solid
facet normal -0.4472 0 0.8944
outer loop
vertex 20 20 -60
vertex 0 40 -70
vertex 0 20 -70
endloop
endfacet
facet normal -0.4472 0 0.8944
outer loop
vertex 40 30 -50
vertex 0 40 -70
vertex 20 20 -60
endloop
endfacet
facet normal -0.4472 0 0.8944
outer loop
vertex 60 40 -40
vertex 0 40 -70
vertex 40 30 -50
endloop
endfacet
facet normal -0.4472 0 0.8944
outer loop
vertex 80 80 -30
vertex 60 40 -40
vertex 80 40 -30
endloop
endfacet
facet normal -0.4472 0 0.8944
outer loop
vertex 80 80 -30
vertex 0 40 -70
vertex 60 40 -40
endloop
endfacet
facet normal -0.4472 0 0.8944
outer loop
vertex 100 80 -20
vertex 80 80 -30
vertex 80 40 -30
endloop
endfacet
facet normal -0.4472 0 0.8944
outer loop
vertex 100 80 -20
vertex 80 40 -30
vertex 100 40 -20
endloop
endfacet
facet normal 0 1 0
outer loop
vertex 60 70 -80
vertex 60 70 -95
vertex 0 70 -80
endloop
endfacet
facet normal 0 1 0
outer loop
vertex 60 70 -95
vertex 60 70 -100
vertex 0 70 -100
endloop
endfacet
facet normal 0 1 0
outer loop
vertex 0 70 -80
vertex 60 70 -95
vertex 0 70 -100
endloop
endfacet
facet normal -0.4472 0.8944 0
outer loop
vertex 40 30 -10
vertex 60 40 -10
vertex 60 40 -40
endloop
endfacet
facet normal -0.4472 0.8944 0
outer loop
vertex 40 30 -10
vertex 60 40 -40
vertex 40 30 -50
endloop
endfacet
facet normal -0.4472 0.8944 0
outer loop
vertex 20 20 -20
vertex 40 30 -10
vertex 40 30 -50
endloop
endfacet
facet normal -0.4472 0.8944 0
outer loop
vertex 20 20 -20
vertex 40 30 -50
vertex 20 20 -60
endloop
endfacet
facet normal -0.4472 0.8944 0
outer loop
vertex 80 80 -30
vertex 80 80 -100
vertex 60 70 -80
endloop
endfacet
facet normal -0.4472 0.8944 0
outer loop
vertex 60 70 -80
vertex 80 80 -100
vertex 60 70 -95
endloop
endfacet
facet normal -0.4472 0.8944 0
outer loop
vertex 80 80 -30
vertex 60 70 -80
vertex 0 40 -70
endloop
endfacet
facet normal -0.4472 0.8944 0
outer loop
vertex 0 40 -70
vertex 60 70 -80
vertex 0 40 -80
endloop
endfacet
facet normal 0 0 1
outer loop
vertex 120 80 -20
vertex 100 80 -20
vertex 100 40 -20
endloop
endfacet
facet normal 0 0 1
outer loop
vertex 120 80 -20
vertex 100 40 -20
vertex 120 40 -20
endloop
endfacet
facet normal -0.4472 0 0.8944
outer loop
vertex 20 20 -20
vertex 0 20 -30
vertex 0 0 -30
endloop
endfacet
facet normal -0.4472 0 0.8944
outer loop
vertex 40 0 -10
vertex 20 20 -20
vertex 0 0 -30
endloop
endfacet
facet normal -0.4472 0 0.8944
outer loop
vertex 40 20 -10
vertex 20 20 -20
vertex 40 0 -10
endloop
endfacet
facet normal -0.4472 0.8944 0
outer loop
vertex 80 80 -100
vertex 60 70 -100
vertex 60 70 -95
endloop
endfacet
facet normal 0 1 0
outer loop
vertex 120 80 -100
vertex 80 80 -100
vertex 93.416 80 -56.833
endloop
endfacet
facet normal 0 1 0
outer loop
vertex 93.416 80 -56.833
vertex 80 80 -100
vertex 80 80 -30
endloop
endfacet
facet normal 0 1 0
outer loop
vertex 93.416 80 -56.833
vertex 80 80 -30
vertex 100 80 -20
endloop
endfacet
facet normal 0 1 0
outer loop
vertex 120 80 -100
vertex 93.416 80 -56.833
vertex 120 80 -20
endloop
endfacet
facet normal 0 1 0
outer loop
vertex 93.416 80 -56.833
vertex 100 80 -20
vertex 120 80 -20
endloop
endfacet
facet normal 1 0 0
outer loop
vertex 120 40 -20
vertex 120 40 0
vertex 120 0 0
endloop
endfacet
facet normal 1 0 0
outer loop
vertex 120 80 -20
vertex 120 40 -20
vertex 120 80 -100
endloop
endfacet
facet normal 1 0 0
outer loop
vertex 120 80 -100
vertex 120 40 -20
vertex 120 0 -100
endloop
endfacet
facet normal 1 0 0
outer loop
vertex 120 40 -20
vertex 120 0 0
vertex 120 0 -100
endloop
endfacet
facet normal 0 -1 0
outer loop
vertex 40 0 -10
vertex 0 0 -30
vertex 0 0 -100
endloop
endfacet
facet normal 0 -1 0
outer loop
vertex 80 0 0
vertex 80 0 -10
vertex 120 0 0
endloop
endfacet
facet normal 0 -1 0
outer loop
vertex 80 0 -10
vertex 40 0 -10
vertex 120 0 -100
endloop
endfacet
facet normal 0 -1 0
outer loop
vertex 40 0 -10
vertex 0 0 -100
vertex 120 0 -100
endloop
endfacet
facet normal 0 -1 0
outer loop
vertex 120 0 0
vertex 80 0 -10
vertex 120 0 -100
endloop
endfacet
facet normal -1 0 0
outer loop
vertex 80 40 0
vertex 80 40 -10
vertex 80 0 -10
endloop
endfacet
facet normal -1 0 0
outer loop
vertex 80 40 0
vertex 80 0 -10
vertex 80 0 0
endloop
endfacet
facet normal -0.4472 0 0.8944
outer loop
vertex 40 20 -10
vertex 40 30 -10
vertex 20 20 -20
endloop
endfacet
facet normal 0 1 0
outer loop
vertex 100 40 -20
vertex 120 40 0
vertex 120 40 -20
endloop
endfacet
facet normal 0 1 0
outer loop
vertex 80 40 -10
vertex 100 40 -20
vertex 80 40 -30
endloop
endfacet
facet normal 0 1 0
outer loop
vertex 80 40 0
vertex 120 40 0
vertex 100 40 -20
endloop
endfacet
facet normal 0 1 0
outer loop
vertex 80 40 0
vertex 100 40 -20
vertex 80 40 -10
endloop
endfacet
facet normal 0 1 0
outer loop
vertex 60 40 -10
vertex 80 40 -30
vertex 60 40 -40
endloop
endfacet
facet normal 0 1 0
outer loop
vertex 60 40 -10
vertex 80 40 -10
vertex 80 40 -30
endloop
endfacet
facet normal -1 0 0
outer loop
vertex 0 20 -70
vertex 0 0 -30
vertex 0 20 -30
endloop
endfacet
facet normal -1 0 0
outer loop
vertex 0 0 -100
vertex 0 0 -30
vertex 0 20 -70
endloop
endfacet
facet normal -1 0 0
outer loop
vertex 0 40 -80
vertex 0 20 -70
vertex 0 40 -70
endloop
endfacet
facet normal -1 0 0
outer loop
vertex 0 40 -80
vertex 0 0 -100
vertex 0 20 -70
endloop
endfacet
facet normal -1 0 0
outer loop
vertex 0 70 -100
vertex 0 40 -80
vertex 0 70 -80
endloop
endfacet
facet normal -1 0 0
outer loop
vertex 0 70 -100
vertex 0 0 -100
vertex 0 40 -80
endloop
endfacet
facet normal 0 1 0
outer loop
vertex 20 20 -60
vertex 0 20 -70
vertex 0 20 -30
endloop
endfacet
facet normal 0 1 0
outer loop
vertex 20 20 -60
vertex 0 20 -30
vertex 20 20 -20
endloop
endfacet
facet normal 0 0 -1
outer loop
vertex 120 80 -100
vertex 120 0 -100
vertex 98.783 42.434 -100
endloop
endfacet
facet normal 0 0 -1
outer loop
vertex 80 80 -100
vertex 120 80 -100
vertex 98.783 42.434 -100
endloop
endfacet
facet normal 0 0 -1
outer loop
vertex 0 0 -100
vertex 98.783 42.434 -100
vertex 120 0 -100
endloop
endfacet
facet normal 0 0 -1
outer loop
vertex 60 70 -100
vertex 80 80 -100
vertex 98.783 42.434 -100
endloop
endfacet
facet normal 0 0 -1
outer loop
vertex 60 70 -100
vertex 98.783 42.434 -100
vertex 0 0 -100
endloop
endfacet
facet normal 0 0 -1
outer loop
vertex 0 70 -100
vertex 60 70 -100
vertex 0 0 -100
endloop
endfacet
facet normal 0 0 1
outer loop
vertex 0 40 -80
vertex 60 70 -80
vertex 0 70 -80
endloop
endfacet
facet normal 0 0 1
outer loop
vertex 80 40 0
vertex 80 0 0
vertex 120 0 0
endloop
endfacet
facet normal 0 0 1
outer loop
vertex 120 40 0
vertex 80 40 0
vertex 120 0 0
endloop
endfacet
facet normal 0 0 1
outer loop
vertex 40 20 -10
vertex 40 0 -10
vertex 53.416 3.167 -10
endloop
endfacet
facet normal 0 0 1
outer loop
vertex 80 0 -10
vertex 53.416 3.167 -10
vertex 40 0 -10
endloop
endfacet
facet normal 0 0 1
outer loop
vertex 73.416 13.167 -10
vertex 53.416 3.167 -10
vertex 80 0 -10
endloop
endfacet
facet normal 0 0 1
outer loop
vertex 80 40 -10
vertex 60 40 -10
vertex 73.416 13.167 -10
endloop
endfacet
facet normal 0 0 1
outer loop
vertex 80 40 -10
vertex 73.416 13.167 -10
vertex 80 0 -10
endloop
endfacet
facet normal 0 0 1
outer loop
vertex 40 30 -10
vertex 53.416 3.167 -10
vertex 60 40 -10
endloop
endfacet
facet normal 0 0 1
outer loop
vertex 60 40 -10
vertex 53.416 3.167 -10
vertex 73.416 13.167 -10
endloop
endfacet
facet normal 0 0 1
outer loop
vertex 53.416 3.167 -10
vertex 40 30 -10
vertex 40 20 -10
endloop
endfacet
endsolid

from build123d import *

# Parameters (mm, degrees)
SKETCH1_W            = 120
SKETCH1_H            = 100
BOSS_EXTRUDE1_DEPTH  = 20
CUT_EXTRUDE1_DEPTH   = 20
SKETCH3_W            = 40
SKETCH3_H            = 40
BOSS_EXTRUDE3_DEPTH  = 100
BOSS_EXTRUDE4_DEPTH  = 90
SKETCH5_W            = 20
SKETCH5_H            = 40
BOSS_EXTRUDE6_DEPTH  = 80
BOSS_EXTRUDE7_DEPTH  = 80
SKETCH7_W            = 60
SKETCH7_H            = 50
BOSS_EXTRUDE8_DEPTH  = 20
SKETCH8_W            = 10
SKETCH8_H            = 20
BOSS_EXTRUDE9_DEPTH  = 10
BOSS_EXTRUDE10_DEPTH = 42
BOSS_EXTRUDE18_DEPTH = 42
BOSS_EXTRUDE19_DEPTH = 30
BOSS_EXTRUDE21_DEPTH = 30
BOSS_EXTRUDE22_DEPTH = 30
BOSS_EXTRUDE23_DEPTH = 30
BOSS_EXTRUDE24_DEPTH = 30
SKETCH22_W           = 120
SKETCH22_H           = 100
CUT_EXTRUDE3_DEPTH   = 30


with BuildPart() as part:
    # Sketch1 → Boss-Extrude1 (new body)
    with BuildSketch(Plane(origin=(0, 0, 0), x_dir=(1, 0, 0), z_dir=(0, 1, 0))):
        with Locations((60, 50)):
            Rectangle(SKETCH1_W, SKETCH1_H)
    extrude(amount=BOSS_EXTRUDE1_DEPTH)

    # Sketch2 → Cut-Extrude1 (cut)
    with BuildSketch(Plane(origin=(0, 20, 0), x_dir=(1, 0, 0), z_dir=(0, 1, 0))):
        Polygon((0, 30), (40, 10), (80, 10), (80, 0), (0, 0), align=None)
    extrude(amount=-CUT_EXTRUDE1_DEPTH, mode=Mode.SUBTRACT)

    # Sketch3 → Boss-Extrude3 (add)
    with BuildSketch(Plane.XY):
        with Locations((100, 20)):
            Rectangle(SKETCH3_W, SKETCH3_H)
    extrude(amount=-BOSS_EXTRUDE3_DEPTH)

    # Sketch4 → Boss-Extrude4 (add)
    with BuildSketch(Plane.XY.offset(-10)):
        Polygon((80, 20), (80, 40), (60, 40), (40, 30), (40, 20), align=None)
    extrude(amount=-BOSS_EXTRUDE4_DEPTH)

    # Sketch5 → Boss-Extrude6 (add)
    with BuildSketch(Plane.XY.offset(-20)):
        with Locations((110, 60)):
            Rectangle(SKETCH5_W, SKETCH5_H)
    extrude(amount=-BOSS_EXTRUDE6_DEPTH)

    # Sketch6 → Boss-Extrude7 (add)
    with BuildSketch(Plane(origin=(0, 80, 0), x_dir=(1, 0, 0), z_dir=(0, 1, 0))):
        Polygon((100, 100), (80, 100), (80, 30), (100, 20), align=None)
    extrude(amount=-BOSS_EXTRUDE7_DEPTH)

    # Sketch7 → Boss-Extrude8 (add)
    with BuildSketch(Plane(origin=(0, 0, -100), x_dir=(-1, 0, 0), z_dir=(0, 0, -1))):
        with Locations((-30, 45)):
            Rectangle(SKETCH7_W, SKETCH7_H)
    extrude(amount=-BOSS_EXTRUDE8_DEPTH)

    # Sketch8 → Boss-Extrude9 (add)
    with BuildSketch(Plane.XY.offset(-80)):
        with Locations((5, 30)):
            Rectangle(SKETCH8_W, SKETCH8_H)
    extrude(amount=BOSS_EXTRUDE9_DEPTH)

    # Sketch9 → Boss-Extrude10 (add)
    with BuildSketch(Plane(origin=(-16, 32, 0), x_dir=(-0.894427191, -0.447213595, 0), z_dir=(0.447213595, -0.894427191, 0))):
        Polygon((-107.33126292, 100), (-107.33126292, 30), (-17.88854382, 70), (-17.88854382, 80), align=None)
    extrude(amount=BOSS_EXTRUDE10_DEPTH)

    # Sketch11 → Boss-Extrude18 (add)
    with BuildSketch(Plane(origin=(0, 0, -100), x_dir=(-1, 0, 0), z_dir=(0, 0, -1))):
        Polygon((-80, 40), (-60, 40), (-60, 70), (-80, 80), align=None)
    extrude(amount=-BOSS_EXTRUDE18_DEPTH)

    # Sketch12 → Boss-Extrude19 (add)
    with BuildSketch(Plane(origin=(28, 0, -56), x_dir=(0.894427191, 0, 0.447213595), z_dir=(-0.447213595, 0, 0.894427191))):
        Polygon((58.137767415, 80), (58.137767415, 40), (-31.304951685, 20), (-31.304951685, 40), align=None)
    extrude(amount=-BOSS_EXTRUDE19_DEPTH)

    # Sketch17 → Boss-Extrude21 (add)
    with BuildSketch(Plane(origin=(28, 0, -56), x_dir=(0.894427191, 0, 0.447213595), z_dir=(-0.447213595, 0, 0.894427191))):
        Polygon((13.416407865, 30), (-31.304951685, 20), (13.416407865, 20), align=None)
    extrude(amount=-BOSS_EXTRUDE21_DEPTH)

    # Sketch19 → Boss-Extrude22 (add)
    with BuildSketch(Plane(origin=(-4, 8, 0), x_dir=(0.894427191, 0.447213595, 0), z_dir=(-0.447213595, 0.894427191, 0))):
        Polygon((26.83281573, 20), (71.55417528, 10), (71.55417528, 40), (26.83281573, 60), align=None)
    extrude(amount=-BOSS_EXTRUDE22_DEPTH)

    # Sketch20 → Boss-Extrude23 (add)
    with BuildSketch(Plane(origin=(-4, 8, 0), x_dir=(0.894427191, 0.447213595, 0), z_dir=(-0.447213595, 0.894427191, 0))):
        Polygon((49.193495505, 10), (26.83281573, 20), (49.193495505, 15), align=None)
    extrude(amount=-BOSS_EXTRUDE23_DEPTH)

    # Sketch21 → Boss-Extrude24 (add)
    with BuildSketch(Plane(origin=(12, 0, -24), x_dir=(0.894427191, 0, 0.447213595), z_dir=(-0.447213595, 0, 0.894427191))):
        Polygon((8.94427191, 20), (31.304951685, 30), (31.304951685, 20), align=None)
    extrude(amount=-BOSS_EXTRUDE24_DEPTH)

    # Sketch22 → Cut-Extrude3 (cut)
    with BuildSketch(Plane.XZ):
        with Locations((60, -50)):
            Rectangle(SKETCH22_W, SKETCH22_H)
    extrude(amount=CUT_EXTRUDE3_DEPTH, mode=Mode.SUBTRACT)


solid = part.part
